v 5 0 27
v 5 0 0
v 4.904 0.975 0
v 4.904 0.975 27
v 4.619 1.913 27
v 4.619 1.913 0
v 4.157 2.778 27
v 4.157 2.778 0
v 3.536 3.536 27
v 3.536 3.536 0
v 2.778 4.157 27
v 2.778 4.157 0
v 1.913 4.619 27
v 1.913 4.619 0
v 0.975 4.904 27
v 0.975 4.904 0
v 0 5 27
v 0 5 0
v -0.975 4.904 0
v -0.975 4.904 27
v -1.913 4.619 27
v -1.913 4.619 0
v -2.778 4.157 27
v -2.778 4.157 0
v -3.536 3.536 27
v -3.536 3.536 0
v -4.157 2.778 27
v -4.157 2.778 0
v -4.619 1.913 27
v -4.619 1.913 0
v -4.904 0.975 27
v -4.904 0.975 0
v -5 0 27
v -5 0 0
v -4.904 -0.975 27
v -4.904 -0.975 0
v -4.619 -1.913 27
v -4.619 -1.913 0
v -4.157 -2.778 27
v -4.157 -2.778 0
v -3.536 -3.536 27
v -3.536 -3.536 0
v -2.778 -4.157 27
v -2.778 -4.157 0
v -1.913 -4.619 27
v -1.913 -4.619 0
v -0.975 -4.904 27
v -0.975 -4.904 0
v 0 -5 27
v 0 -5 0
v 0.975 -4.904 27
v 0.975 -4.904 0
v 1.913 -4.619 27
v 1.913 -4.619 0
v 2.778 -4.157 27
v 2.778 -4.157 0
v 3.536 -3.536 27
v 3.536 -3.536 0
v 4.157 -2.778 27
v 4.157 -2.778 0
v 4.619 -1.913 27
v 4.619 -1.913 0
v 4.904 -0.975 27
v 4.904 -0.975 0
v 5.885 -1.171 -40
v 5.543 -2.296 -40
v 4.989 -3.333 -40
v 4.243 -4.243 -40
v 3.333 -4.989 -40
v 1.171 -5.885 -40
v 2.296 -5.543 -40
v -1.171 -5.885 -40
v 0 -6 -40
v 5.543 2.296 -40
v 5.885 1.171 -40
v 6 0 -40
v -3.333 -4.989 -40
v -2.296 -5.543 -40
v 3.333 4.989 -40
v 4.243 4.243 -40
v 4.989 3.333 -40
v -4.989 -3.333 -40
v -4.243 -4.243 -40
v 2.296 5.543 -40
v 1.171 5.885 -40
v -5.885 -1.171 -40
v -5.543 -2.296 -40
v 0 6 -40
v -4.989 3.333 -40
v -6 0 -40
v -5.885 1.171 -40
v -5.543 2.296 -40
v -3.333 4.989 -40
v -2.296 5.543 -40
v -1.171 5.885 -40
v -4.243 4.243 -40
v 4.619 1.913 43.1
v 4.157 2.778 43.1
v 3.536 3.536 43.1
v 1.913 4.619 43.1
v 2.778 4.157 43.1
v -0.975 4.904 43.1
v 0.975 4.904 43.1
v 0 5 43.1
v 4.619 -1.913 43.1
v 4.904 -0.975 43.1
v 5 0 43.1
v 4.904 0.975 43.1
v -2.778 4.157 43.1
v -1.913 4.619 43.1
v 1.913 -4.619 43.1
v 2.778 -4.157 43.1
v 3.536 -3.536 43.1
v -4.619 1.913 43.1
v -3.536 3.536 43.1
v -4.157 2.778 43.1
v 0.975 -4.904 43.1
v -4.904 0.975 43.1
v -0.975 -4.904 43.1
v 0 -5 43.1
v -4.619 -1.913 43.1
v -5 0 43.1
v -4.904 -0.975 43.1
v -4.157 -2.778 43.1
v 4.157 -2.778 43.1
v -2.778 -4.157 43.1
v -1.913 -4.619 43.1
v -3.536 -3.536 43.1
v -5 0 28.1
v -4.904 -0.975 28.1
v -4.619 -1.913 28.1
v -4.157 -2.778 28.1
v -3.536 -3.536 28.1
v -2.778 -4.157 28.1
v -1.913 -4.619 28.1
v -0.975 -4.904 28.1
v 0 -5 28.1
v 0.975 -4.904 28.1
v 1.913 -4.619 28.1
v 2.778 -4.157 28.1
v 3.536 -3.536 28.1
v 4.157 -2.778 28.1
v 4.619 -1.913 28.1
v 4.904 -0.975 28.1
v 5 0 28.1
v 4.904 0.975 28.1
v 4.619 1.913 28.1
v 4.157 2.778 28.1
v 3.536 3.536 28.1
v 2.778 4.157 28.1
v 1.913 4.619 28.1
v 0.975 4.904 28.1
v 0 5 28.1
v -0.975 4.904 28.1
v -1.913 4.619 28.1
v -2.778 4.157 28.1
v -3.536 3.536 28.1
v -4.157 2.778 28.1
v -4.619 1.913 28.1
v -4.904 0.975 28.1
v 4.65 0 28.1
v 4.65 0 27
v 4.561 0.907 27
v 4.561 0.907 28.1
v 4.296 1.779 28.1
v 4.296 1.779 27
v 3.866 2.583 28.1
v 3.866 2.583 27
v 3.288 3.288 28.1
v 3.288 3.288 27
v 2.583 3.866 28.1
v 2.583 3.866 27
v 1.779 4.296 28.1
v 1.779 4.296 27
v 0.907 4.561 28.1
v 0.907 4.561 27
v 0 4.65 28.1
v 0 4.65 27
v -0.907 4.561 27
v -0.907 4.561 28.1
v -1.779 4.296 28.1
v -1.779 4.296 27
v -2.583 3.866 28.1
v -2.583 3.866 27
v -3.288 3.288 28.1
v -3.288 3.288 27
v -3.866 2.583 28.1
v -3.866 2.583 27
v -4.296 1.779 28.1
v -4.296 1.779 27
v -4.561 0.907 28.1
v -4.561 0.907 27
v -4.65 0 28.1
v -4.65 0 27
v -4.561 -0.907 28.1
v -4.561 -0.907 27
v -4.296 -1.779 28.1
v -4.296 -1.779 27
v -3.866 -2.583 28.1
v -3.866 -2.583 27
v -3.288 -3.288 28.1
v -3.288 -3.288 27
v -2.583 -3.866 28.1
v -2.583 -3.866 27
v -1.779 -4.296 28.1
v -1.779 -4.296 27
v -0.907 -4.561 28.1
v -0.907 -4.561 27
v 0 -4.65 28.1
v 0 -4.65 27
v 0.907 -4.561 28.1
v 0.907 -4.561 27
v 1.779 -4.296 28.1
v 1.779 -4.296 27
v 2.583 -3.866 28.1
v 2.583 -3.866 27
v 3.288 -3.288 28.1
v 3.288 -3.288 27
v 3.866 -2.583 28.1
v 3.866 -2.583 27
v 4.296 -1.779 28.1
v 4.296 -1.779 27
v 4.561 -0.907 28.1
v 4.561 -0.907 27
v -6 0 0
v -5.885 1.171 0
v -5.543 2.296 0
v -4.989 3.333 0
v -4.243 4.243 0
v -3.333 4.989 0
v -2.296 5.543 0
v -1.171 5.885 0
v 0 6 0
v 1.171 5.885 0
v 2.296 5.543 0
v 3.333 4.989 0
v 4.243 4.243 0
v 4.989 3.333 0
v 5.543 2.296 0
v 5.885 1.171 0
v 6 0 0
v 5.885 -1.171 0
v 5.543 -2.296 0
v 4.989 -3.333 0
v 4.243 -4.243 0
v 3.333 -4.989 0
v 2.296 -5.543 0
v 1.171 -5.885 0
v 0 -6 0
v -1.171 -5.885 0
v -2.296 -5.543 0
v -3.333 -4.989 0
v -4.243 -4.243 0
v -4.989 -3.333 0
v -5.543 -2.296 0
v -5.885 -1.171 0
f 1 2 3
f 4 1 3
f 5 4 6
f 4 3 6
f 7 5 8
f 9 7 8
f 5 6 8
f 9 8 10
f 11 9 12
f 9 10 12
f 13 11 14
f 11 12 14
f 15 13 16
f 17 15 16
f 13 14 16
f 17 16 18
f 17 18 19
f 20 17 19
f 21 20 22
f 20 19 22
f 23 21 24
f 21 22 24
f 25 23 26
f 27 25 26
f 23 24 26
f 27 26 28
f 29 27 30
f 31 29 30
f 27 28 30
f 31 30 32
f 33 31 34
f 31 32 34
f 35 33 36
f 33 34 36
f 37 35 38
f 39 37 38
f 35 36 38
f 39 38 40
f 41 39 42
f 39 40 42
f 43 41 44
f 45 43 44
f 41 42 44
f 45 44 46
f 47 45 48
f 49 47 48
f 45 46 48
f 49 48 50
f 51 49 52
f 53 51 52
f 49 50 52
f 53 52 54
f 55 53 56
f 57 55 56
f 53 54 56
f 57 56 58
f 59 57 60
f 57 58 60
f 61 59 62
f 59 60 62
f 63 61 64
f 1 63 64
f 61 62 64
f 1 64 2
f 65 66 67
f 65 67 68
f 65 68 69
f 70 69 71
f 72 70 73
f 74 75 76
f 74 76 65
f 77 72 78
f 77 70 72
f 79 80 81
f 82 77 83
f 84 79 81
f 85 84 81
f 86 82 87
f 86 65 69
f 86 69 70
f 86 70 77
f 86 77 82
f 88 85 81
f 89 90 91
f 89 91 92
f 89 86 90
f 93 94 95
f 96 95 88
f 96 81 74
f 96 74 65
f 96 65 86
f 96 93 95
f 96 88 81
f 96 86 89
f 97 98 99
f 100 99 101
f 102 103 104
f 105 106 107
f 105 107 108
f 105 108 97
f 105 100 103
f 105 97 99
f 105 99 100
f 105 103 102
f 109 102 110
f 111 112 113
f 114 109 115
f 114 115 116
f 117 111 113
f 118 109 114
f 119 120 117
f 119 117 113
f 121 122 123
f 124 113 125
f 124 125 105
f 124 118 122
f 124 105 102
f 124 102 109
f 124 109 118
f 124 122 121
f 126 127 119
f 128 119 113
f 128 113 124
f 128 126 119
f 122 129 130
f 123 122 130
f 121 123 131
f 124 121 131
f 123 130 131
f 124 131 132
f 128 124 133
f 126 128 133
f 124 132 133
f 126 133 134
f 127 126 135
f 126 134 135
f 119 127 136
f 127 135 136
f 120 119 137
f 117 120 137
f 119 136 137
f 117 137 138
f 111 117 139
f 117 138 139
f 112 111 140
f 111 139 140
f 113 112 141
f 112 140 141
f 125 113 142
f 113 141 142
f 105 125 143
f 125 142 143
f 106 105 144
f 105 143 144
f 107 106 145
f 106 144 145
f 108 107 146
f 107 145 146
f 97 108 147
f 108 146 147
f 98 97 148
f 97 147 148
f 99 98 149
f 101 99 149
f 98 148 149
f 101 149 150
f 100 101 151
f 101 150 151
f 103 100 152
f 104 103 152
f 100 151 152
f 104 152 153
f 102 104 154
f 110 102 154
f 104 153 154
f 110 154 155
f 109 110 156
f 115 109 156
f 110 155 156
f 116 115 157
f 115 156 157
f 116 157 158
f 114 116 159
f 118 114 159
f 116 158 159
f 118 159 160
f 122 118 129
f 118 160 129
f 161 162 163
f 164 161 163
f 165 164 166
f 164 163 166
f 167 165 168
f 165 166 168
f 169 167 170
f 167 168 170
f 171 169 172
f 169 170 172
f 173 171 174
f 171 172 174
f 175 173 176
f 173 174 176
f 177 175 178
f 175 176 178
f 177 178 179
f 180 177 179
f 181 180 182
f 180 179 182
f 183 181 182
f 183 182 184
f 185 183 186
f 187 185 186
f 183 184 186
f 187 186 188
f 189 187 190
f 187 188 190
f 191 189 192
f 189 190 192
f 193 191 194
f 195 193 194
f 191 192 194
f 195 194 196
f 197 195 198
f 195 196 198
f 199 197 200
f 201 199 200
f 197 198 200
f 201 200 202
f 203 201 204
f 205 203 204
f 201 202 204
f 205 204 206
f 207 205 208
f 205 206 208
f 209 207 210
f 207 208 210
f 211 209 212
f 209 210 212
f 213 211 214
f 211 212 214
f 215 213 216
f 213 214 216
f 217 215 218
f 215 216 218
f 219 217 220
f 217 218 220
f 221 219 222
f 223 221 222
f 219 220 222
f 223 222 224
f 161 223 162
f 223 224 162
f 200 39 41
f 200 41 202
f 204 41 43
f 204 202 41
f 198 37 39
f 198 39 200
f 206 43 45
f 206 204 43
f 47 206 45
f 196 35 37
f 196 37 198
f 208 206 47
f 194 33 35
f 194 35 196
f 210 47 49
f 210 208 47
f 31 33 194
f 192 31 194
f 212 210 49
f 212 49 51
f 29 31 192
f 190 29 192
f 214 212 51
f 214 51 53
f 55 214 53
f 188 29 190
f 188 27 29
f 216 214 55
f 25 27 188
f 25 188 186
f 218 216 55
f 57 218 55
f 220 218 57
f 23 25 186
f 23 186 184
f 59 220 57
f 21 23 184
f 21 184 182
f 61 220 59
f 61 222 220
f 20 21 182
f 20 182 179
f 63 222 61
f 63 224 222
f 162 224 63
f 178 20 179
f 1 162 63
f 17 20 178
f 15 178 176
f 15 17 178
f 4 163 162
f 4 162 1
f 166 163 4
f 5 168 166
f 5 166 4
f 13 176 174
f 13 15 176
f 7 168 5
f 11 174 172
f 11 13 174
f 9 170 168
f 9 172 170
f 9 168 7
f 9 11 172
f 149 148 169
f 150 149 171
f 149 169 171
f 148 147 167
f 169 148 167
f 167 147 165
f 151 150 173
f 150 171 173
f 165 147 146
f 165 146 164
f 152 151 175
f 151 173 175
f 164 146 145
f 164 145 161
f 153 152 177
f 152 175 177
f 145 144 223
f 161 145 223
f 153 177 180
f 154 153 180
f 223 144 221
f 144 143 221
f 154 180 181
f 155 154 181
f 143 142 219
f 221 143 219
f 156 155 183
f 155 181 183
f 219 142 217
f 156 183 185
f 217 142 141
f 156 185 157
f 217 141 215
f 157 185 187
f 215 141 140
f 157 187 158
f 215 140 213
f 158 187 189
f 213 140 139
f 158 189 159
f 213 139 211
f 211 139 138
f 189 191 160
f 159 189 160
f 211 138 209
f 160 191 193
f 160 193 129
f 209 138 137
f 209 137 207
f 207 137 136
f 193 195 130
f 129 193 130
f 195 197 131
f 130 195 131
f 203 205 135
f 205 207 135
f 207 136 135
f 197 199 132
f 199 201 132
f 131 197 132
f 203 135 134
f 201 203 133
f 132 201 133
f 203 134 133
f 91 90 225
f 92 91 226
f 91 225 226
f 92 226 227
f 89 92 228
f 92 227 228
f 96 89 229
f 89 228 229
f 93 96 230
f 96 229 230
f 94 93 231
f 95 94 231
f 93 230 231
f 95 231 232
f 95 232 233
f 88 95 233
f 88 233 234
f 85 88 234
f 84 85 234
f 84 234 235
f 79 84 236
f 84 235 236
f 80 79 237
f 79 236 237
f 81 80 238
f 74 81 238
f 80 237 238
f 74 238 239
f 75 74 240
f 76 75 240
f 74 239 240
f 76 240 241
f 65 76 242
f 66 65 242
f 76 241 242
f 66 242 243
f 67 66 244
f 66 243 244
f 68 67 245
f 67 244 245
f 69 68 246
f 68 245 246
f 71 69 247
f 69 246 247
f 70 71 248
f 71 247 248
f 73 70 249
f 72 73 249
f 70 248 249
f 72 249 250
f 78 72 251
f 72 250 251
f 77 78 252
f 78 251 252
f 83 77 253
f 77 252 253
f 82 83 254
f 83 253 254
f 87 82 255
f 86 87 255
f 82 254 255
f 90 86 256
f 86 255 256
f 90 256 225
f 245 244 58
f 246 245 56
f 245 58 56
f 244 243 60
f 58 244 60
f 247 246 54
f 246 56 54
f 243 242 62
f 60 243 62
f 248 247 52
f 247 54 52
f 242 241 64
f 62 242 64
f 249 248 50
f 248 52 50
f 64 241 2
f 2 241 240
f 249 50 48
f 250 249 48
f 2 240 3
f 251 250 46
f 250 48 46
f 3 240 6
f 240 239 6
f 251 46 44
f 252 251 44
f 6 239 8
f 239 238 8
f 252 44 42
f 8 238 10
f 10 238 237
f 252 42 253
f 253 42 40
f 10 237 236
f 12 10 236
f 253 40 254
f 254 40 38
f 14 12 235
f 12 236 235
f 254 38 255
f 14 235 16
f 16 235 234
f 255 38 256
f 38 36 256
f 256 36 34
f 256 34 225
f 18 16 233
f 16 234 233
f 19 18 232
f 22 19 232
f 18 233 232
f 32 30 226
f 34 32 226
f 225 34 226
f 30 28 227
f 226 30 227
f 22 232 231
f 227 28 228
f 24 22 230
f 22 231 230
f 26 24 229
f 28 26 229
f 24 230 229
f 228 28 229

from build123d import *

# Parameters (mm, degrees)
SKETCH_1_R      = 5
EXTRUDE_1_DEPTH = 27
SKETCH_2_R      = 6
EXTRUDE_2_DEPTH = 40
SKETCH_3_R      = 4.65
EXTRUDE_3_DEPTH = 1.1
SKETCH_4_R      = 5
EXTRUDE_4_DEPTH = 15


with BuildPart() as part:
    # 草图1 → 凸台-拉伸1 (new body)
    with BuildSketch(Plane.XY):
        Circle(SKETCH_1_R)
    extrude(amount=EXTRUDE_1_DEPTH)

    # 草图2 → 凸台-拉伸2 (add)
    with BuildSketch(Plane(origin=(0, 0, 0), x_dir=(-1, 0, 0), z_dir=(0, 0, -1))):
        Circle(SKETCH_2_R)
    extrude(amount=EXTRUDE_2_DEPTH)

    # 草图3 → 凸台-拉伸3 (add)
    with BuildSketch(Plane.XY.offset(27)):
        Circle(SKETCH_3_R)
    extrude(amount=EXTRUDE_3_DEPTH)

    # 草图4 → 凸台-拉伸4 (add)
    with BuildSketch(Plane.XY.offset(28.1)):
        with Locations(Location((0, 0, 0), (0, 0, 180))):
            Circle(SKETCH_4_R)
    extrude(amount=EXTRUDE_4_DEPTH)


solid = part.part
